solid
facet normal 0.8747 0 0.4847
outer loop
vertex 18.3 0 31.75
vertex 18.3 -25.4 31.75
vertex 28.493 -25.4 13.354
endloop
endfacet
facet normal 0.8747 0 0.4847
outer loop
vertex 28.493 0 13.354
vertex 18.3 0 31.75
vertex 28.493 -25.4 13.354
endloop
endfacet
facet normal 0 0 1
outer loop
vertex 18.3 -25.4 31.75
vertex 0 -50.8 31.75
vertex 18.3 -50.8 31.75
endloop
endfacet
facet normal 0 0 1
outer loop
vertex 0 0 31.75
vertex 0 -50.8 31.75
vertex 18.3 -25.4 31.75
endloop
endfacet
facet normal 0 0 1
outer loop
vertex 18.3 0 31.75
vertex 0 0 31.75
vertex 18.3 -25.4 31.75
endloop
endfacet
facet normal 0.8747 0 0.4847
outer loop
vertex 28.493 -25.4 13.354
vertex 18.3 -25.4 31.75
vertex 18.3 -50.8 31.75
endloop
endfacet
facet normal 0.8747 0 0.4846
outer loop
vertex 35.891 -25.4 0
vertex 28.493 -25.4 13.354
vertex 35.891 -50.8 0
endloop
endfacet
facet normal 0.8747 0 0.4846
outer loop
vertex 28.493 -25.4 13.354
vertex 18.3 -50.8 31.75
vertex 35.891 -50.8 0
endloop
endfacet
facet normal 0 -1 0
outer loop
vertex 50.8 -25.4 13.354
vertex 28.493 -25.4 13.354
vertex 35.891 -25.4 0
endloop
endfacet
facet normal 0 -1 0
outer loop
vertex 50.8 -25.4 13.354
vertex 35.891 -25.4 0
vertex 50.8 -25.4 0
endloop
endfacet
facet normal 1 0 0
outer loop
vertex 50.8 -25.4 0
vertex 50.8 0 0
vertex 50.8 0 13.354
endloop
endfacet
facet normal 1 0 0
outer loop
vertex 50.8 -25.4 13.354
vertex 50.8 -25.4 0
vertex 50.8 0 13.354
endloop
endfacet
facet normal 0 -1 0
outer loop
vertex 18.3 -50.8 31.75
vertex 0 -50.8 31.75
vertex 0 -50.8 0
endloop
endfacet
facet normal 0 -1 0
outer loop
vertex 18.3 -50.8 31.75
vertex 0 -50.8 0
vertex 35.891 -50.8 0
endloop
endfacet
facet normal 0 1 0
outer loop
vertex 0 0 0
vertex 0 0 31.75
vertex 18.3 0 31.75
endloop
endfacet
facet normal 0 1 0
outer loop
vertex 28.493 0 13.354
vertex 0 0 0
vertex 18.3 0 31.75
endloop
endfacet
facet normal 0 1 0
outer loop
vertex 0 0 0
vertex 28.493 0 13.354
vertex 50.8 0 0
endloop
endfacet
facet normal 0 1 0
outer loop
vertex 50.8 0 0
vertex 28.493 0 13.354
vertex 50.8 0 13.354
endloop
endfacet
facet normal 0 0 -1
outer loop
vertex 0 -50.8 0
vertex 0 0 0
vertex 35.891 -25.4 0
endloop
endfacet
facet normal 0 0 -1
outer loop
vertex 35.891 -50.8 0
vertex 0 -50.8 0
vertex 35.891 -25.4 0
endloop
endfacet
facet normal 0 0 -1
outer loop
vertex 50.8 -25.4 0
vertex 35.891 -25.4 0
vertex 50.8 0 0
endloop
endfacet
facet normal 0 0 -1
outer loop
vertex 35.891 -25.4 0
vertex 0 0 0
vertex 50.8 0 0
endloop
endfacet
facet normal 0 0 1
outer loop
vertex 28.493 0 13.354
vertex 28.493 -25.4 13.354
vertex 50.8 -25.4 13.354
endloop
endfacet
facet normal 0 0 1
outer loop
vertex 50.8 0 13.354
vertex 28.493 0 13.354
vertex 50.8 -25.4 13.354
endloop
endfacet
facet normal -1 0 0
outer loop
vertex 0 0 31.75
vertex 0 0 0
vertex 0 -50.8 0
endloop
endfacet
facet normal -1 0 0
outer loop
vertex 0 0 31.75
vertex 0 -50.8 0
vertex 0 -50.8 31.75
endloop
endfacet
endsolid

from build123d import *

# Parameters (mm, degrees)
F0_W     = 50.8
F0_H     = 31.75
F1_DEPTH = 50.8
F3_DEPTH = 25.4
F5_DEPTH = 25.4


with BuildPart() as f1:
    # F0 (on Front) → F1 (new body)
    with BuildSketch(Plane.XZ):
        with Locations((25.4, 15.875)):
            Rectangle(F0_W, F0_H)
    extrude(amount=F1_DEPTH)

    # F2 (on face) → F3 (cut)
    with BuildSketch(Plane.XZ.offset(50.8)):
        Polygon((50.8, 31.75), (18.300158903, 31.75), (35.8910150826, 0), (50.8, 0), align=None)
    extrude(amount=-F3_DEPTH, mode=Mode.SUBTRACT)

    # F4 (on face) → F5 (cut)
    with BuildSketch(Plane.XZ.offset(25.4)):
        Polygon((18.300158903, 31.75), (28.4925211666, 13.3536525702), (50.8, 13.3536525702), (50.8, 31.75), align=None)
    extrude(amount=-F5_DEPTH, mode=Mode.SUBTRACT)


solid = f1.part
